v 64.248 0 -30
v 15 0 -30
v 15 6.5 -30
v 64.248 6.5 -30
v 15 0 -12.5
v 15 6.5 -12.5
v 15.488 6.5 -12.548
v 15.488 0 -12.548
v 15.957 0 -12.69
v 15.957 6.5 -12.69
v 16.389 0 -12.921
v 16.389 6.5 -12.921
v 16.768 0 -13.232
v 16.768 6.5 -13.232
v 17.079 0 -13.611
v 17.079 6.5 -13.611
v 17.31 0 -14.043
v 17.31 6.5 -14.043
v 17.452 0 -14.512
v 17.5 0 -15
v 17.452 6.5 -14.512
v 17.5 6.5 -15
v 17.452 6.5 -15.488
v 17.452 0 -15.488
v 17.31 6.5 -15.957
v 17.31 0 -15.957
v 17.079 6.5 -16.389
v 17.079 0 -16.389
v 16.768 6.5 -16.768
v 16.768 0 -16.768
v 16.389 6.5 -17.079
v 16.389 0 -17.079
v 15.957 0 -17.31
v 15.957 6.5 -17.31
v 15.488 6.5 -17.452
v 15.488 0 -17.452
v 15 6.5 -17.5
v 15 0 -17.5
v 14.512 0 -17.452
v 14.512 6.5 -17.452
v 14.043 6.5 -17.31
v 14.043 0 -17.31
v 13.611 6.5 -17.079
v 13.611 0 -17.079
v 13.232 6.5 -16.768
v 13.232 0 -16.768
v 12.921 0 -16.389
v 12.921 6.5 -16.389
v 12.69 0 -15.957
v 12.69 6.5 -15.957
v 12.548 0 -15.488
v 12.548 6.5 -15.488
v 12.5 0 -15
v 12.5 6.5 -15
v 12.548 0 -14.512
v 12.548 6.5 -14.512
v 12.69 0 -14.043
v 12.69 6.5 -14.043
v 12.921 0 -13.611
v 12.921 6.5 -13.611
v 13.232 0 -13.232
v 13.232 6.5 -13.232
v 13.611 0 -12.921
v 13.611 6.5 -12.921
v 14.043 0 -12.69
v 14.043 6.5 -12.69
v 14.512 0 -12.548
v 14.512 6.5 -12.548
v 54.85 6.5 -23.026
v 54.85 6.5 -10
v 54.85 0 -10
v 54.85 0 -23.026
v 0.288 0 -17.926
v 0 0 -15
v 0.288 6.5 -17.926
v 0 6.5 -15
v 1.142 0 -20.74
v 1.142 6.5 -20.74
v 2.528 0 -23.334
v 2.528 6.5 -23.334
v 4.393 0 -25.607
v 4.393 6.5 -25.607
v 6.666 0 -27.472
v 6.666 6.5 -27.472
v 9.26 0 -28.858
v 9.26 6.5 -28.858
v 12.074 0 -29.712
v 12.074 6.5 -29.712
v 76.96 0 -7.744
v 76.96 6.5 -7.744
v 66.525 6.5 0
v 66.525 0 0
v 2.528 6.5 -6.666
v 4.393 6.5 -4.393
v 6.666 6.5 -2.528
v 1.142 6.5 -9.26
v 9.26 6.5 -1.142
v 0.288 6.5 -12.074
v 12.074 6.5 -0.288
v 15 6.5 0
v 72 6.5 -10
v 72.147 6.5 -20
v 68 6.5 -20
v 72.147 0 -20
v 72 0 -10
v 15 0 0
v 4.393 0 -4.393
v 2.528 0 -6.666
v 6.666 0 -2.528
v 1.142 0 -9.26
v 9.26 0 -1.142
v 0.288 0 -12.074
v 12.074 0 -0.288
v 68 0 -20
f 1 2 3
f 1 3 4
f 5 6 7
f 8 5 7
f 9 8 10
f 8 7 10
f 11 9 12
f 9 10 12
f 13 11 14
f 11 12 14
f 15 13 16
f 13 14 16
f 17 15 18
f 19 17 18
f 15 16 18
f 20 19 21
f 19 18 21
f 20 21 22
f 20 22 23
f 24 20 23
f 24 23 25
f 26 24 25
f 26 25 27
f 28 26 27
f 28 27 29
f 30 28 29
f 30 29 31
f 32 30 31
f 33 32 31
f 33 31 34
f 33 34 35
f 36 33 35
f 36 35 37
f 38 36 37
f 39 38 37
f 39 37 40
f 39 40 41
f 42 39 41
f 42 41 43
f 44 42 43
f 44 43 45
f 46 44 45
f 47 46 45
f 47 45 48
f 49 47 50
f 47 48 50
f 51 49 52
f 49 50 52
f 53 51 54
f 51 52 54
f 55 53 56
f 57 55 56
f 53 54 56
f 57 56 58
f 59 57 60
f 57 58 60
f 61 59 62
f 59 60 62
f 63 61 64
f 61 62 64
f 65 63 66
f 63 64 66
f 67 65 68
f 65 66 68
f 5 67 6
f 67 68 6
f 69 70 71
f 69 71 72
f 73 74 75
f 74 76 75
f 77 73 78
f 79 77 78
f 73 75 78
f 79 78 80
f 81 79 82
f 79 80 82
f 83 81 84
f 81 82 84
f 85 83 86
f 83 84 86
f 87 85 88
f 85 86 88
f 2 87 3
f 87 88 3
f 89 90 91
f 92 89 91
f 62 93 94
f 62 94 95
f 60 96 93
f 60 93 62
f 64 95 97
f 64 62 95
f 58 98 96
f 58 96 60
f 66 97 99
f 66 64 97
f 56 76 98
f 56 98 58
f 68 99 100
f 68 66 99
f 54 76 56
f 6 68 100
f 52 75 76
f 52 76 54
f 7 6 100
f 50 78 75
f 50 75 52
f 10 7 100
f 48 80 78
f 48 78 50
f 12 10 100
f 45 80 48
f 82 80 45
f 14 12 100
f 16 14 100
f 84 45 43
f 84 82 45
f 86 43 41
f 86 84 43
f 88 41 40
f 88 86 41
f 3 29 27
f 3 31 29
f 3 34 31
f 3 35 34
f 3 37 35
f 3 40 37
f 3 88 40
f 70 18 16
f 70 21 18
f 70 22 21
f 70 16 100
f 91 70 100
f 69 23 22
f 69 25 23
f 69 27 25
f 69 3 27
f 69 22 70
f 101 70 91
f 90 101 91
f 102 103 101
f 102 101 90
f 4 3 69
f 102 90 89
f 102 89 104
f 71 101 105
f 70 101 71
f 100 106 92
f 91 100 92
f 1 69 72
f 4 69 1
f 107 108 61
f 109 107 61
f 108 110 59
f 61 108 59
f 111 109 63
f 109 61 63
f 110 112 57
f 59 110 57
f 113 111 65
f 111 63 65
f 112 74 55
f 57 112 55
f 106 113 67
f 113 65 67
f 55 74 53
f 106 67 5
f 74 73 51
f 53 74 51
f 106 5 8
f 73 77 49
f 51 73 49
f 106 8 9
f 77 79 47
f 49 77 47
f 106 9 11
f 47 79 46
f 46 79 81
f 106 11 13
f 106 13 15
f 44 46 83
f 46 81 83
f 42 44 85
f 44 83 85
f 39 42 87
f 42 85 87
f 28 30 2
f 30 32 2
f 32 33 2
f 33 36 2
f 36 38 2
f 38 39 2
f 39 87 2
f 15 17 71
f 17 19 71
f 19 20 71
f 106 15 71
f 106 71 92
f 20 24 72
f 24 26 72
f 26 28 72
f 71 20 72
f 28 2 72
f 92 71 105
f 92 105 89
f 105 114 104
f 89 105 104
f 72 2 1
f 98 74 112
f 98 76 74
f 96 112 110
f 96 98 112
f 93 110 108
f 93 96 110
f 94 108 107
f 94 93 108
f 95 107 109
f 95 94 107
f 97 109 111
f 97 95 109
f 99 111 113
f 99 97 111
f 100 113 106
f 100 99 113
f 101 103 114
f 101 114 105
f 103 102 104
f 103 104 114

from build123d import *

# Parameters (mm, degrees)
SKETCH1_W           = 80
SKETCH1_H           = 30
BOSS_EXTRUDE1_DEPTH = 6.5
FILLET1_R           = 15
CUT_EXTRUDE1_REACH  = 87.687
SKETCH2_R           = 2.5
CUT_EXTRUDE2_DEPTH  = 86.686930159
CUT_EXTRUDE3_REACH  = 87.687
CUT_EXTRUDE4_DEPTH  = 86.686930159


with BuildPart() as part:
    # Sketch1 → Boss-Extrude1 (new body)
    with BuildSketch(Plane(origin=(0, 0, 0), x_dir=(1, 0, 0), z_dir=(0, 1, 0))):
        with Locations((40, 15)):
            Rectangle(SKETCH1_W, SKETCH1_H)
    extrude(amount=BOSS_EXTRUDE1_DEPTH)

    # Fillet1
    fillet1_edges = [part.edges().sort_by_distance(p)[0] for p in [
        (0, 3.25, 0),
        (0, 3.25, -30),
    ]]
    fillet(fillet1_edges, radius=FILLET1_R - 0.0001)  # a hair under: the kernel refuses the full size

    # Sketch2 → Cut-Extrude1 (cut, up to next)
    with BuildSketch(Plane(origin=(0, 6.5, 0), x_dir=(1, 0, 0), z_dir=(0, 1, 0)), mode=Mode.PRIVATE) as cut_extrude1_sk1:
        with Locations(Location((15, 15, 0), (0, 0, 270))):
            Circle(SKETCH2_R)
    cut_extrude1_tool1 = extrude(cut_extrude1_sk1.sketch, amount=-CUT_EXTRUDE1_REACH, mode=Mode.PRIVATE) & part.part
    add(cut_extrude1_tool1.solids().sort_by_distance((15, 6.5, -15))[0], mode=Mode.SUBTRACT)

    # Sketch3 → Cut-Extrude2 (cut, through all)
    with BuildSketch(Plane(origin=(0, 6.5, 0), x_dir=(1, 0, 0), z_dir=(0, 1, 0))):
        Polygon((68, 20), (72, 10), (54.850407656, 10), (54.850407656, 23.025538444), (64.248213181, 30), (80, 30), (80, 20), align=None)
    extrude(amount=-CUT_EXTRUDE2_DEPTH, mode=Mode.SUBTRACT)

    # Sketch4 → Cut-Extrude3 (cut, up to next)
    with BuildSketch(Plane(origin=(0, 6.5, 0), x_dir=(1, 0, 0), z_dir=(0, 1, 0)), mode=Mode.PRIVATE) as cut_extrude3_sk1:
        Polygon((80, 20), (80, 0), (72.147195496, 20), align=None)
    cut_extrude3_tool1 = extrude(cut_extrude3_sk1.sketch, amount=-CUT_EXTRUDE3_REACH, mode=Mode.PRIVATE) & part.part
    add(cut_extrude3_tool1.solids().sort_by_distance((77.382398, 6.5, -13.333333))[0], mode=Mode.SUBTRACT)

    # Sketch5 → Cut-Extrude4 (cut, through all)
    with BuildSketch(Plane(origin=(0, 6.5, 0), x_dir=(1, 0, 0), z_dir=(0, 1, 0))):
        Polygon((80, 0), (80, 10), (66.525403502, 0), align=None)
    extrude(amount=-CUT_EXTRUDE4_DEPTH, mode=Mode.SUBTRACT)


solid = part.part
